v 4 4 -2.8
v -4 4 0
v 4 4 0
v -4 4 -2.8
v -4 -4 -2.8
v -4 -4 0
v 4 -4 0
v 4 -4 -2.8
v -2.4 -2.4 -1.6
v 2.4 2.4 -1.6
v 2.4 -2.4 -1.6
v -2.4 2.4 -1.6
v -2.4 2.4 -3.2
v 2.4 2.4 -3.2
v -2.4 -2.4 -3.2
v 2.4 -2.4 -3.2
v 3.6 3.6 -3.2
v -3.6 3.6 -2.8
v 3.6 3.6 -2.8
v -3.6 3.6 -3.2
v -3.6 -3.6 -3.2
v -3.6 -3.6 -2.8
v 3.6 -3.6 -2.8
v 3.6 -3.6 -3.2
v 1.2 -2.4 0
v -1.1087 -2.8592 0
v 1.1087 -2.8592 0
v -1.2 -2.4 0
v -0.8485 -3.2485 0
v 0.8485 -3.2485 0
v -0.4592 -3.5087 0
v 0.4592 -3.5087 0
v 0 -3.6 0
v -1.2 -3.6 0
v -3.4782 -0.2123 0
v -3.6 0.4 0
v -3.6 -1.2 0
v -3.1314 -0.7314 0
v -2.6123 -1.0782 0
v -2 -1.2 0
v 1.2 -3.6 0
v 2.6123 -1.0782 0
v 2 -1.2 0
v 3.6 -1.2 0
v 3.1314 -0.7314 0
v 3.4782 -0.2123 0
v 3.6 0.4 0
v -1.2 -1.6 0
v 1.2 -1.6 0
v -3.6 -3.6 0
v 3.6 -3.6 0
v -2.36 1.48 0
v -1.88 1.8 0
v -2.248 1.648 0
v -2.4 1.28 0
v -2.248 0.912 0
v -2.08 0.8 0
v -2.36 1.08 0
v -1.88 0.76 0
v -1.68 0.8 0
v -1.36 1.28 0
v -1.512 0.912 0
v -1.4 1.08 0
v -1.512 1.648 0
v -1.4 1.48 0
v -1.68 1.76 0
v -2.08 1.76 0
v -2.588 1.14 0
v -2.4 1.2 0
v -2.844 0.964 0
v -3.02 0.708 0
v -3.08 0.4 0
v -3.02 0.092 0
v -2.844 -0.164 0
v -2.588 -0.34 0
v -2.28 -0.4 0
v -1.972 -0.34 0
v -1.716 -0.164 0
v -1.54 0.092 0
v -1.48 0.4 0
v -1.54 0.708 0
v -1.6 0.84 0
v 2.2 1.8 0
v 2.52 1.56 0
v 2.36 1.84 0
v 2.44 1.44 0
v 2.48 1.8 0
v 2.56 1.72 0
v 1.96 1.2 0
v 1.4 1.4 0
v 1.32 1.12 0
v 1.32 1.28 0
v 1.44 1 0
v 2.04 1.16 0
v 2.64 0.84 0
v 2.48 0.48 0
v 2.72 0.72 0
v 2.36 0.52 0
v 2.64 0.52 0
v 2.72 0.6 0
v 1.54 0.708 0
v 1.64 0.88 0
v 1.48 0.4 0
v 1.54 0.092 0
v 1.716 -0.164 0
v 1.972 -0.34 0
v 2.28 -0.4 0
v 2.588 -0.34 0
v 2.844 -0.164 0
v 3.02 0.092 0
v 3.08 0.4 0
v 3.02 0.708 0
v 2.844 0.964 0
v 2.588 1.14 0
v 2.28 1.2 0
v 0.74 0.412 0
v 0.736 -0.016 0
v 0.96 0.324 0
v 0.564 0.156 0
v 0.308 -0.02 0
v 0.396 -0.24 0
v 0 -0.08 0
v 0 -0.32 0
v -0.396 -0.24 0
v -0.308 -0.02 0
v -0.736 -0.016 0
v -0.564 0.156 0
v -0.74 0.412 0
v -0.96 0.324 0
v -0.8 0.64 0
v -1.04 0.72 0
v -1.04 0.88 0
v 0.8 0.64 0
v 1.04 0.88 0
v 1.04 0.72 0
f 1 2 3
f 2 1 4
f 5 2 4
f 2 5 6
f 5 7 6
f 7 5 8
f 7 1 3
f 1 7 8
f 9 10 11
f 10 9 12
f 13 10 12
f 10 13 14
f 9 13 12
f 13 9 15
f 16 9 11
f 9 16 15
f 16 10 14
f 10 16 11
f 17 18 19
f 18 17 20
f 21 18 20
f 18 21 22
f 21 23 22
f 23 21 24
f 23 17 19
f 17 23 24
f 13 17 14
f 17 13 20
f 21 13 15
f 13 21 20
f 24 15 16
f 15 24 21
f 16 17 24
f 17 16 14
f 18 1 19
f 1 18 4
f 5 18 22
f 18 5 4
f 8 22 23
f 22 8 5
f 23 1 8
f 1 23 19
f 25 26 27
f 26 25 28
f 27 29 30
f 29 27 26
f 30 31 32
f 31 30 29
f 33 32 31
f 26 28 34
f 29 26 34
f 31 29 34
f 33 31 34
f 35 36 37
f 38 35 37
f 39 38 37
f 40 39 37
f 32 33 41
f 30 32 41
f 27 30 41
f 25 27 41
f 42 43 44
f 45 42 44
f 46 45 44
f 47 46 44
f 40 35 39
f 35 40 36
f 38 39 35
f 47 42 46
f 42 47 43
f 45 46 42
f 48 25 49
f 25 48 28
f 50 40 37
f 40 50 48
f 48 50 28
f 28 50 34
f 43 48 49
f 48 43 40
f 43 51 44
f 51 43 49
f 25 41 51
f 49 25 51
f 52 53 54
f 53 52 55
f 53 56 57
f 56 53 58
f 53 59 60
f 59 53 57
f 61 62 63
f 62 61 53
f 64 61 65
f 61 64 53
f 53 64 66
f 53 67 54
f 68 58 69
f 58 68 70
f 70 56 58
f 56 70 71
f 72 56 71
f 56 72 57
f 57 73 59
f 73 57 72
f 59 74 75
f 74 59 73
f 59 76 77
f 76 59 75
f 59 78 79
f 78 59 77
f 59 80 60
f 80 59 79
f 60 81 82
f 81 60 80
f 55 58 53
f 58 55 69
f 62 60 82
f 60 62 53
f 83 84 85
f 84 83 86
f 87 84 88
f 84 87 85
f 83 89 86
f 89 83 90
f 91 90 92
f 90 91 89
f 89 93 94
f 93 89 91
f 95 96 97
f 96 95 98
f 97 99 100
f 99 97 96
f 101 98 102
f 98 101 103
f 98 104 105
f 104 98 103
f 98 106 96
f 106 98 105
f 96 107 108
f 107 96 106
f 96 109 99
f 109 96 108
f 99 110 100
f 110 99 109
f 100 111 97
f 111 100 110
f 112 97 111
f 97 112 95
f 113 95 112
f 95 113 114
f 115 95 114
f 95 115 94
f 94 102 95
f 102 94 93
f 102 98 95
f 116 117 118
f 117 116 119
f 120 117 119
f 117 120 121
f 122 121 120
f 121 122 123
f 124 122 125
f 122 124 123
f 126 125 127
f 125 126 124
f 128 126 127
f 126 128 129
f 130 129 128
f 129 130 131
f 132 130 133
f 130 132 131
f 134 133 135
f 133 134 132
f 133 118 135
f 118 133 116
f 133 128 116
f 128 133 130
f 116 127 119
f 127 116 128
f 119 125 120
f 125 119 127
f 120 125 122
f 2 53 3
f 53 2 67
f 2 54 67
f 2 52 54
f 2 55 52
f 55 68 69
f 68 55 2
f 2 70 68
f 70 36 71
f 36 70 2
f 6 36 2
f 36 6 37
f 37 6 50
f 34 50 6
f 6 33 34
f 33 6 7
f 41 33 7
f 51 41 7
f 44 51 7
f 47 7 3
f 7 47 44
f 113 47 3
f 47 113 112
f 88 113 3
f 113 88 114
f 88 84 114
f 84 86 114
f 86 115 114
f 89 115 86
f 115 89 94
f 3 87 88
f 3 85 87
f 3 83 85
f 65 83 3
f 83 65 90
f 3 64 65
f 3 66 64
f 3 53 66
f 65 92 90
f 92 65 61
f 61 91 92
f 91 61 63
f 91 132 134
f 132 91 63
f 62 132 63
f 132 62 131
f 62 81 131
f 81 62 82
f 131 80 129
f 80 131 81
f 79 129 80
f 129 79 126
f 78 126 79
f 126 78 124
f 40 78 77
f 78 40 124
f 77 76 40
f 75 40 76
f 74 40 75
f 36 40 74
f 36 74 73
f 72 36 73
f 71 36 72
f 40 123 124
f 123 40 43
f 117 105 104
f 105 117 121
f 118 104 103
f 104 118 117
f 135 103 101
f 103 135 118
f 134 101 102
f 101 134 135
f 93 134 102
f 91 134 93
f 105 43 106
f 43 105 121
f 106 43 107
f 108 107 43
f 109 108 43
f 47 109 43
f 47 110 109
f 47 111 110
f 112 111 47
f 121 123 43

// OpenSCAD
// file: ../p/box5.scad
use <../lib.scad>
function ldraw_lib__box5() = [
// 0 Box with 5 Faces and All Edges
// 0 Name: box5.dat
// 0 Author: James Jessiman
// 0 !LDRAW_ORG Primitive UPDATE 2012-01
// 0 !LICENSE Licensed under CC BY 4.0 : see CAreadme.txt
// 
// 0 BFC CERTIFY CCW
  [0,"BFC","CERTIFY"],
  [0,"BFC","CCW"],
// 
// 0 !HISTORY 2002-04-03 [sbliss] Modified for BFC compliance
// 0 !HISTORY 2002-04-25 [PTadmin] Official Update 2002-02
// 0 !HISTORY 2007-06-24 [PTadmin] Header formatted for Contributor Agreement
// 0 !HISTORY 2008-07-01 [PTadmin] Official Update 2008-01
// 0 !HISTORY 2012-02-16 [Philo] Changed to CCW
// 0 !HISTORY 2012-03-30 [PTadmin] Official Update 2012-01
// 
// 
// 2 24 1 1 1 -1 1 1
  [2,24,1,1,1,-1,1,1],
// 2 24 -1 1 1 -1 1 -1
  [2,24,-1,1,1,-1,1,-1],
// 2 24 -1 1 -1 1 1 -1
  [2,24,-1,1,-1,1,1,-1],
// 2 24 1 1 -1 1 1 1
  [2,24,1,1,-1,1,1,1],
// 2 24 1 0 1 -1 0 1
  [2,24,1,0,1,-1,0,1],
// 2 24 -1 0 1 -1 0 -1
  [2,24,-1,0,1,-1,0,-1],
// 2 24 -1 0 -1 1 0 -1
  [2,24,-1,0,-1,1,0,-1],
// 2 24 1 0 -1 1 0 1
  [2,24,1,0,-1,1,0,1],
// 2 24 1 0 1 1 1 1
  [2,24,1,0,1,1,1,1],
// 2 24 -1 0 1 -1 1 1
  [2,24,-1,0,1,-1,1,1],
// 2 24 1 0 -1 1 1 -1
  [2,24,1,0,-1,1,1,-1],
// 2 24 -1 0 -1 -1 1 -1
  [2,24,-1,0,-1,-1,1,-1],
// 4 16 -1 1 1 1 1 1 1 1 -1 -1 1 -1
  [4,16,-1,1,1,1,1,1,1,1,-1,-1,1,-1],
// 4 16 -1 1 1 -1 0 1 1 0 1 1 1 1
  [4,16,-1,1,1,-1,0,1,1,0,1,1,1,1],
// 4 16 -1 1 -1 -1 0 -1 -1 0 1 -1 1 1
  [4,16,-1,1,-1,-1,0,-1,-1,0,1,-1,1,1],
// 4 16 1 1 -1 1 0 -1 -1 0 -1 -1 1 -1
  [4,16,1,1,-1,1,0,-1,-1,0,-1,-1,1,-1],
// 4 16 1 1 1 1 0 1 1 0 -1 1 1 -1
  [4,16,1,1,1,1,0,1,1,0,-1,1,1,-1],
];
module ldraw_lib__box5(step=0, col=false, unit=2/5, alt=false, line=0.2, solid=!$preview)
    makepoly(ldraw_lib__box5(), step=step, col=col, unit=unit, alt=alt, line=line, solid=solid);
ldraw_lib__box5(line=0.2);
// file: ../p/box4.scad
use <../lib.scad>
function ldraw_lib__box4() = [
// 0 Box with 4 Faces (2 Parallel Pairs) and All Edges
// 0 Name: box4.dat
// 0 Author: James Jessiman
// 0 !LDRAW_ORG Primitive UPDATE 2012-01
// 0 !LICENSE Licensed under CC BY 4.0 : see CAreadme.txt
// 
// 0 BFC CERTIFY CCW
  [0,"BFC","CERTIFY"],
  [0,"BFC","CCW"],
// 
// 0 !HISTORY 2002-04-03 [sbliss] Modified for BFC compliance
// 0 !HISTORY 2002-04-25 [PTadmin] Official Update 2002-02
// 0 !HISTORY 2007-06-24 [PTadmin] Header formatted for Contributor Agreement
// 0 !HISTORY 2008-07-01 [PTadmin] Official Update 2008-01
// 0 !HISTORY 2012-02-16 [Philo] Changed to CCW
// 0 !HISTORY 2012-03-30 [PTadmin] Official Update 2012-01
// 
// 
// 2 24 1 1 1 -1 1 1
  [2,24,1,1,1,-1,1,1],
// 2 24 -1 1 1 -1 1 -1
  [2,24,-1,1,1,-1,1,-1],
// 2 24 -1 1 -1 1 1 -1
  [2,24,-1,1,-1,1,1,-1],
// 2 24 1 1 -1 1 1 1
  [2,24,1,1,-1,1,1,1],
// 2 24 1 0 1 -1 0 1
  [2,24,1,0,1,-1,0,1],
// 2 24 -1 0 1 -1 0 -1
  [2,24,-1,0,1,-1,0,-1],
// 2 24 -1 0 -1 1 0 -1
  [2,24,-1,0,-1,1,0,-1],
// 2 24 1 0 -1 1 0 1
  [2,24,1,0,-1,1,0,1],
// 2 24 1 0 1 1 1 1
  [2,24,1,0,1,1,1,1],
// 2 24 -1 0 1 -1 1 1
  [2,24,-1,0,1,-1,1,1],
// 2 24 1 0 -1 1 1 -1
  [2,24,1,0,-1,1,1,-1],
// 2 24 -1 0 -1 -1 1 -1
  [2,24,-1,0,-1,-1,1,-1],
// 4 16 -1 1 1 -1 0 1 1 0 1 1 1 1
  [4,16,-1,1,1,-1,0,1,1,0,1,1,1,1],
// 4 16 -1 1 -1 -1 0 -1 -1 0 1 -1 1 1
  [4,16,-1,1,-1,-1,0,-1,-1,0,1,-1,1,1],
// 4 16 1 1 -1 1 0 -1 -1 0 -1 -1 1 -1
  [4,16,1,1,-1,1,0,-1,-1,0,-1,-1,1,-1],
// 4 16 1 1 1 1 0 1 1 0 -1 1 1 -1
  [4,16,1,1,1,1,0,1,1,0,-1,1,1,-1],
];
module ldraw_lib__box4(step=0, col=false, unit=2/5, alt=false, line=0.2, solid=!$preview)
    makepoly(ldraw_lib__box4(), step=step, col=col, unit=unit, alt=alt, line=line, solid=solid);
ldraw_lib__box4(line=0.2);
// file: s/3070bs01.scad
use <../../lib.scad>
use <../../p/box4.scad>
use <../../p/box5.scad>
function ldraw_lib__s__3070bs01() = [
// 0 ~Tile  1 x  1 with Groove without Top Face
// 0 Name: s\3070bs01.dat
// 0 Author: Chris Dee [cwdee]
// 0 !LDRAW_ORG Subpart UPDATE 2009-02
// 0 !LICENSE Licensed under CC BY 4.0 : see CAreadme.txt
// 
// 0 BFC CERTIFY CCW
  [0,"BFC","CERTIFY"],
  [0,"BFC","CCW"],
// 
// 0 !HISTORY 2009-09-03 [PTadmin] Official Update 2009-02
// 
// 
// 1 16 0 0 0 10 0 0 0 7 0 0 0 10 box4.dat
  [1,16,0,0,0,10,0,0,0,7,0,0,0,10, ldraw_lib__box4()],
// 0 BFC INVERTNEXT
  [0,"BFC","INVERTNEXT"],
// 1 16 0 8 0 6 0 0 0 -4 0 0 0 6 box5.dat
  [1,16,0,8,0,6,0,0,0,-4,0,0,0,6, ldraw_lib__box5()],
// 1 16 0 7 0 9 0 0 0 1 0 0 0 9 box4.dat
  [1,16,0,7,0,9,0,0,0,1,0,0,0,9, ldraw_lib__box4()],
// 
// 4 16 9 8 9 6 8 6 -6 8 6 -9 8 9
  [4,16,9,8,9,6,8,6,-6,8,6,-9,8,9],
// 4 16 -9 8 9 -6 8 6 -6 8 -6 -9 8 -9
  [4,16,-9,8,9,-6,8,6,-6,8,-6,-9,8,-9],
// 4 16 -9 8 -9 -6 8 -6 6 8 -6 9 8 -9
  [4,16,-9,8,-9,-6,8,-6,6,8,-6,9,8,-9],
// 4 16 9 8 -9 6 8 -6 6 8 6 9 8 9
  [4,16,9,8,-9,6,8,-6,6,8,6,9,8,9],
// 
// 4 16 10 7 10 9 7 9 -9 7 9 -10 7 10
  [4,16,10,7,10,9,7,9,-9,7,9,-10,7,10],
// 4 16 -10 7 10 -9 7 9 -9 7 -9 -10 7 -10
  [4,16,-10,7,10,-9,7,9,-9,7,-9,-10,7,-10],
// 4 16 -10 7 -10 -9 7 -9 9 7 -9 10 7 -10
  [4,16,-10,7,-10,-9,7,-9,9,7,-9,10,7,-10],
// 4 16 10 7 -10 9 7 -9 9 7 9 10 7 10
  [4,16,10,7,-10,9,7,-9,9,7,9,10,7,10],
// 0
];
module ldraw_lib__s__3070bs01(step=0, col=false, unit=2/5, alt=false, line=0.2, solid=!$preview)
    makepoly(ldraw_lib__s__3070bs01(), step=step, col=col, unit=unit, alt=alt, line=line, solid=solid);
ldraw_lib__s__3070bs01(line=0.2);
// file: ../p/2-4chrd.scad
use <../lib.scad>
function ldraw_lib__2_4chrd() = [
// 0 Chord 0.5
// 0 Name: 2-4chrd.dat
// 0 Author: Philippe Hurbain [Philo]
// 0 !LDRAW_ORG Primitive UPDATE 2014-01
// 0 !LICENSE Licensed under CC BY 4.0 : see CAreadme.txt
// 
// 0 BFC CERTIFY CCW
  [0,"BFC","CERTIFY"],
  [0,"BFC","CCW"],
// 
// 0 !HISTORY 2014-06-21 [PTadmin] Official Update 2014-01
// 
// 
// 4 16 0.9239 0 0.3827 -0.9239 0 0.3827 -1 0 0 1 0 0
  [4,16,0.9239,0,0.3827,-0.9239,0,0.3827,-1,0,0,1,0,0],
// 4 16 0.7071 0 0.7071 -0.7071 0 0.7071 -0.9239 0 0.3827 0.9239 0 0.3827
  [4,16,0.7071,0,0.7071,-0.7071,0,0.7071,-0.9239,0,0.3827,0.9239,0,0.3827],
// 4 16 0.3827 0 0.9239 -0.3827 0 0.9239 -0.7071 0 0.7071 0.7071 0 0.7071
  [4,16,0.3827,0,0.9239,-0.3827,0,0.9239,-0.7071,0,0.7071,0.7071,0,0.7071],
// 3 16 0 0 1 -0.3827 0 0.9239 0.3827 0 0.9239
  [3,16,0,0,1,-0.3827,0,0.9239,0.3827,0,0.9239],
];
module ldraw_lib__2_4chrd(step=0, col=false, unit=2/5, alt=false, line=0.2, solid=!$preview)
    makepoly(ldraw_lib__2_4chrd(), step=step, col=col, unit=unit, alt=alt, line=line, solid=solid);
ldraw_lib__2_4chrd(line=0.2);
// file: ../p/1-4ndis.scad
use <../lib.scad>
function ldraw_lib__1_4ndis() = [
// 0 Disc Negative 0.25
// 0 Name: 1-4ndis.dat
// 0 Author: James Jessiman
// 0 !LDRAW_ORG Primitive UPDATE 2012-01
// 0 !LICENSE Licensed under CC BY 4.0 : see CAreadme.txt
// 
// 0 BFC CERTIFY CCW
  [0,"BFC","CERTIFY"],
  [0,"BFC","CCW"],
// 
// 0 !HISTORY 2002-03-23 [sbliss] Added BFC Statement
// 0 !HISTORY 2002-04-25 [PTadmin] Official Update 2002-02
// 0 !HISTORY 2007-06-22 [PTadmin] Header formatted for Contributor Agreement
// 0 !HISTORY 2008-07-01 [PTadmin] Official Update 2008-01
// 0 !HISTORY 2012-02-16 [Philo] Changed to CCW
// 0 !HISTORY 2012-03-30 [PTadmin] Official Update 2012-01
// 
// 
// 3 16 0.9239 0 0.3827 1 0 0 1 0 1
  [3,16,0.9239,0,0.3827,1,0,0,1,0,1],
// 3 16 0.7071 0 0.7071 0.9239 0 0.3827 1 0 1
  [3,16,0.7071,0,0.7071,0.9239,0,0.3827,1,0,1],
// 3 16 0.3827 0 0.9239 0.7071 0 0.7071 1 0 1
  [3,16,0.3827,0,0.9239,0.7071,0,0.7071,1,0,1],
// 3 16 0 0 1 0.3827 0 0.9239 1 0 1
  [3,16,0,0,1,0.3827,0,0.9239,1,0,1],
];
module ldraw_lib__1_4ndis(step=0, col=false, unit=2/5, alt=false, line=0.2, solid=!$preview)
    makepoly(ldraw_lib__1_4ndis(), step=step, col=col, unit=unit, alt=alt, line=line, solid=solid);
ldraw_lib__1_4ndis(line=0.2);
// file: ../p/1-4chrd.scad
use <../lib.scad>
function ldraw_lib__1_4chrd() = [
// 0 Chord 0.25
// 0 Name: 1-4chrd.dat
// 0 Author: Max Martin Richter [MMR1988]
// 0 !LDRAW_ORG Primitive UPDATE 2023-05
// 0 !LICENSE Licensed under CC BY 4.0 : see CAreadme.txt
// 
// 0 BFC CERTIFY CCW
  [0,"BFC","CERTIFY"],
  [0,"BFC","CCW"],
// 
// 0 !HISTORY 2004-04-22 [PTadmin] Official Update 2004-02
// 0 !HISTORY 2007-10-09 [PTadmin] Header formatted for Contributor Agreement
// 0 !HISTORY 2008-07-01 [PTadmin] Official Update 2008-01
// 0 !HISTORY 2012-08-02 [MMR1988] Re-creation with PrimGen2 and Rectifier
// 0 !HISTORY 2012-08-09 [PTadmin] Official Update 2012-02
// 0 !HISTORY 2023-10-27 [OrionP] Change author to MMR1988 from hafhead
// 0 !HISTORY 2023-10-31 [OrionP] Official Update 2023-05
// 
// 4 16 0.9239 0 0.3827 0.3827 0 0.9239 0 0 1 1 0 0
  [4,16,0.9239,0,0.3827,0.3827,0,0.9239,0,0,1,1,0,0],
// 3 16 0.7071 0 0.7071 0.3827 0 0.9239 0.9239 0 0.3827
  [3,16,0.7071,0,0.7071,0.3827,0,0.9239,0.9239,0,0.3827],
];
module ldraw_lib__1_4chrd(step=0, col=false, unit=2/5, alt=false, line=0.2, solid=!$preview)
    makepoly(ldraw_lib__1_4chrd(), step=step, col=col, unit=unit, alt=alt, line=line, solid=solid);
ldraw_lib__1_4chrd(line=0.2);
// main file
use <../lib.scad>
use <../p/1-4chrd.scad>
use <../p/1-4ndis.scad>
use <../p/2-4chrd.scad>
use <s/3070bs01.scad>
function ldraw_lib__3070bp1d() = [
// 0 Tile  1 x  1 with Emoji Face, Left Wink, Coral Mouth and Cheeks Pattern
// 0 Name: 3070bp1d.dat
// 0 Author: Takeshi Takahashi [RainbowDolphin]
// 0 !LDRAW_ORG Part UPDATE 2024-06
// 0 !LICENSE Licensed under CC BY 4.0 : see CAreadme.txt
// 
// 0 BFC CERTIFY CCW
  [0,"BFC","CERTIFY"],
  [0,"BFC","CCW"],
// 
// 0 !KEYWORDS Bricklink 3070bpb202, Brickowl 610474, Dots, Ice cream
// 0 !KEYWORDS Rebrickable 3070bpr0218, Set 41910
// 
// 0 !HISTORY 2024-07-29 [OrionP] Official Update 2024-06
// 
// 1 16 0 0 0 1 0 0 0 1 0 0 0 1 s\3070bs01.dat
  [1,16,0,0,0,1,0,0,0,1,0,0,0,1, ldraw_lib__s__3070bs01()],
// 1 25 0 0 -6 -3 0 0 0 1 0 0 0 -3 2-4chrd.dat
  [1,25,0,0,-6,-3,0,0,0,1,0,0,0,-3, ldraw_lib__2_4chrd()],
// 1 14 0 0 -6 -3 0 0 0 1 0 0 0 -3 1-4ndis.dat
  [1,14,0,0,-6,-3,0,0,0,1,0,0,0,-3, ldraw_lib__1_4ndis()],
// 1 14 -5 0 1 -4 0 0 0 1 0 0 0 -4 1-4ndis.dat
  [1,14,-5,0,1,-4,0,0,0,1,0,0,0,-4, ldraw_lib__1_4ndis()],
// 1 14 0 0 -6 0 0 3 0 1 0 -3 0 0 1-4ndis.dat
  [1,14,0,0,-6,0,0,3,0,1,0,-3,0,0, ldraw_lib__1_4ndis()],
// 1 14 5 0 1 0 0 4 0 1 0 -4 0 0 1-4ndis.dat
  [1,14,5,0,1,0,0,4,0,1,0,-4,0,0, ldraw_lib__1_4ndis()],
// 1 16 -5 0 1 -4 0 0 0 1 0 0 0 -4 1-4chrd.dat
  [1,16,-5,0,1,-4,0,0,0,1,0,0,0,-4, ldraw_lib__1_4chrd()],
// 1 16 5 0 1 0 0 4 0 1 0 -4 0 0 1-4chrd.dat
  [1,16,5,0,1,0,0,4,0,1,0,-4,0,0, ldraw_lib__1_4chrd()],
// 4 25 3 0 -4 -3 0 -4 -3 0 -6 3 0 -6
  [4,25,3,0,-4,-3,0,-4,-3,0,-6,3,0,-6],
// 4 14 -5 0 -3 -9 0 -3 -9 0 -9 -3 0 -4
  [4,14,-5,0,-3,-9,0,-3,-9,0,-9,-3,0,-4],
// 3 14 -3 0 -4 -9 0 -9 -3 0 -6
  [3,14,-3,0,-4,-9,0,-9,-3,0,-6],
// 3 14 -3 0 -6 -9 0 -9 -3 0 -9
  [3,14,-3,0,-6,-9,0,-9,-3,0,-9],
// 4 14 -5 0 -3 -3 0 -4 3 0 -4 5 0 -3
  [4,14,-5,0,-3,-3,0,-4,3,0,-4,5,0,-3],
// 4 14 5 0 -3 3 0 -4 9 0 -9 9 0 -3
  [4,14,5,0,-3,3,0,-4,9,0,-9,9,0,-3],
// 3 14 3 0 -6 3 0 -9 9 0 -9
  [3,14,3,0,-6,3,0,-9,9,0,-9],
// 3 14 3 0 -4 3 0 -6 9 0 -9
  [3,14,3,0,-4,3,0,-6,9,0,-9],
// 4 0 -5.9 0 3.7 -6 0 3.2 -4.7 0 4.5 -5.62 0 4.12
  [4,0,-5.9,0,3.7,-6,0,3.2,-4.7,0,4.5,-5.62,0,4.12],
// 4 0 -4.7 0 4.5 -5.9 0 2.7 -5.62 0 2.28 -5.2 0 2
  [4,0,-4.7,0,4.5,-5.9,0,2.7,-5.62,0,2.28,-5.2,0,2],
// 4 0 -4.7 0 4.5 -5.2 0 2 -4.7 0 1.9 -4.2 0 2
  [4,0,-4.7,0,4.5,-5.2,0,2,-4.7,0,1.9,-4.2,0,2],
// 4 0 -4.7 0 4.5 -3.78 0 2.28 -3.5 0 2.7 -3.4 0 3.2
  [4,0,-4.7,0,4.5,-3.78,0,2.28,-3.5,0,2.7,-3.4,0,3.2],
// 4 0 -4.7 0 4.5 -3.4 0 3.2 -3.5 0 3.7 -3.78 0 4.12
  [4,0,-4.7,0,4.5,-3.4,0,3.2,-3.5,0,3.7,-3.78,0,4.12],
// 3 0 -4.7 0 4.5 -3.78 0 4.12 -4.2 0 4.4
  [3,0,-4.7,0,4.5,-3.78,0,4.12,-4.2,0,4.4],
// 3 0 -4.7 0 4.5 -5.2 0 4.4 -5.62 0 4.12
  [3,0,-4.7,0,4.5,-5.2,0,4.4,-5.62,0,4.12],
// 4 353 -5.9 0 2.7 -6 0 3 -6.47 0 2.85 -7.11 0 2.41
  [4,353,-5.9,0,2.7,-6,0,3,-6.47,0,2.85,-7.11,0,2.41],
// 4 353 -5.62 0 2.28 -5.9 0 2.7 -7.11 0 2.41 -7.55 0 1.77
  [4,353,-5.62,0,2.28,-5.9,0,2.7,-7.11,0,2.41,-7.55,0,1.77],
// 4 353 -5.2 0 2 -5.62 0 2.28 -7.55 0 1.77 -7.7 0 1
  [4,353,-5.2,0,2,-5.62,0,2.28,-7.55,0,1.77,-7.7,0,1],
// 4 353 -4.7 0 1.9 -5.2 0 2 -7.7 0 1 -7.55 0 0.23
  [4,353,-4.7,0,1.9,-5.2,0,2,-7.7,0,1,-7.55,0,0.23],
// 4 353 -4.7 0 1.9 -7.55 0 0.23 -7.11 0 -0.41 -6.47 0 -0.85
  [4,353,-4.7,0,1.9,-7.55,0,0.23,-7.11,0,-0.41,-6.47,0,-0.85],
// 4 353 -4.7 0 1.9 -6.47 0 -0.85 -5.7 0 -1 -4.93 0 -0.85
  [4,353,-4.7,0,1.9,-6.47,0,-0.85,-5.7,0,-1,-4.93,0,-0.85],
// 4 353 -4.7 0 1.9 -4.93 0 -0.85 -4.29 0 -0.41 -3.85 0 0.23
  [4,353,-4.7,0,1.9,-4.93,0,-0.85,-4.29,0,-0.41,-3.85,0,0.23],
// 4 353 -4.2 0 2 -4.7 0 1.9 -3.85 0 0.23 -3.7 0 1
  [4,353,-4.2,0,2,-4.7,0,1.9,-3.85,0,0.23,-3.7,0,1],
// 4 353 -4 0 2.1 -4.2 0 2 -3.7 0 1 -3.85 0 1.77
  [4,353,-4,0,2.1,-4.2,0,2,-3.7,0,1,-3.85,0,1.77],
// 4 0 -4.7 0 4.5 -6 0 3.2 -6 0 3 -5.9 0 2.7
  [4,0,-4.7,0,4.5,-6,0,3.2,-6,0,3,-5.9,0,2.7],
// 4 0 -4 0 2.1 -3.78 0 2.28 -4.7 0 4.5 -4.2 0 2
  [4,0,-4,0,2.1,-3.78,0,2.28,-4.7,0,4.5,-4.2,0,2],
// 4 0 5.9 0 4.6 5.5 0 4.5 6.1 0 3.6 6.3 0 3.9
  [4,0,5.9,0,4.6,5.5,0,4.5,6.1,0,3.6,6.3,0,3.9],
// 4 0 6.2 0 4.5 5.9 0 4.6 6.3 0 3.9 6.4 0 4.3
  [4,0,6.2,0,4.5,5.9,0,4.6,6.3,0,3.9,6.4,0,4.3],
// 4 0 4.9 0 3 6.1 0 3.6 5.5 0 4.5 3.5 0 3.5
  [4,0,4.9,0,3,6.1,0,3.6,5.5,0,4.5,3.5,0,3.5],
// 4 0 4.9 0 3 3.5 0 3.5 3.3 0 3.2 3.3 0 2.8
  [4,0,4.9,0,3,3.5,0,3.5,3.3,0,3.2,3.3,0,2.8],
// 4 0 4.9 0 3 3.3 0 2.8 3.6 0 2.5 5.1 0 2.9
  [4,0,4.9,0,3,3.3,0,2.8,3.6,0,2.5,5.1,0,2.9],
// 4 0 6.8 0 1.8 6.6 0 2.1 5.9 0 1.3 6.2 0 1.2
  [4,0,6.8,0,1.8,6.6,0,2.1,5.9,0,1.3,6.2,0,1.2],
// 4 0 6.8 0 1.8 6.2 0 1.2 6.6 0 1.3 6.8 0 1.5
  [4,0,6.8,0,1.8,6.2,0,1.2,6.6,0,1.3,6.8,0,1.5],
// 4 353 5.9 0 1.3 4.1 0 2.2 3.85 0 1.77 3.7 0 1
  [4,353,5.9,0,1.3,4.1,0,2.2,3.85,0,1.77,3.7,0,1],
// 4 353 5.9 0 1.3 3.7 0 1 3.85 0 0.23 4.29 0 -0.41
  [4,353,5.9,0,1.3,3.7,0,1,3.85,0,0.23,4.29,0,-0.41],
// 4 353 5.9 0 1.3 4.29 0 -0.41 4.93 0 -0.85 6.2 0 1.2
  [4,353,5.9,0,1.3,4.29,0,-0.41,4.93,0,-0.85,6.2,0,1.2],
// 4 353 6.2 0 1.2 4.93 0 -0.85 5.7 0 -1 6.47 0 -0.85
  [4,353,6.2,0,1.2,4.93,0,-0.85,5.7,0,-1,6.47,0,-0.85],
// 4 353 6.6 0 1.3 6.2 0 1.2 6.47 0 -0.85 7.11 0 -0.41
  [4,353,6.6,0,1.3,6.2,0,1.2,6.47,0,-0.85,7.11,0,-0.41],
// 4 353 6.8 0 1.5 6.6 0 1.3 7.11 0 -0.41 7.55 0 0.23
  [4,353,6.8,0,1.5,6.6,0,1.3,7.11,0,-0.41,7.55,0,0.23],
// 4 353 6.8 0 1.5 7.55 0 0.23 7.7 0 1 6.8 0 1.8
  [4,353,6.8,0,1.5,7.55,0,0.23,7.7,0,1,6.8,0,1.8],
// 4 353 6.8 0 1.8 7.7 0 1 7.55 0 1.77 6.6 0 2.1
  [4,353,6.8,0,1.8,7.7,0,1,7.55,0,1.77,6.6,0,2.1],
// 4 353 6.6 0 2.1 7.55 0 1.77 7.11 0 2.41 6.47 0 2.85
  [4,353,6.6,0,2.1,7.55,0,1.77,7.11,0,2.41,6.47,0,2.85],
// 4 353 6.6 0 2.1 6.47 0 2.85 5.7 0 3 5.1 0 2.9
  [4,353,6.6,0,2.1,6.47,0,2.85,5.7,0,3,5.1,0,2.9],
// 4 0 5.1 0 2.9 3.6 0 2.5 4.1 0 2.2 6.6 0 2.1
  [4,0,5.1,0,2.9,3.6,0,2.5,4.1,0,2.2,6.6,0,2.1],
// 3 0 4.1 0 2.2 5.9 0 1.3 6.6 0 2.1
  [3,0,4.1,0,2.2,5.9,0,1.3,6.6,0,2.1],
// 4 0 2.4 0 0.81 1.85 0 1.03 1.41 0 0.39 1.84 0 -0.04
  [4,0,2.4,0,0.81,1.85,0,1.03,1.41,0,0.39,1.84,0,-0.04],
// 4 0 1.84 0 -0.04 1.41 0 0.39 0.77 0 -0.05 0.99 0 -0.6
  [4,0,1.84,0,-0.04,1.41,0,0.39,0.77,0,-0.05,0.99,0,-0.6],
// 4 0 0.99 0 -0.6 0.77 0 -0.05 0 0 -0.2 0 0 -0.8
  [4,0,0.99,0,-0.6,0.77,0,-0.05,0,0,-0.2,0,0,-0.8],
// 4 0 0 0 -0.8 0 0 -0.2 -0.77 0 -0.05 -0.99 0 -0.6
  [4,0,0,0,-0.8,0,0,-0.2,-0.77,0,-0.05,-0.99,0,-0.6],
// 4 0 -0.99 0 -0.6 -0.77 0 -0.05 -1.41 0 0.39 -1.84 0 -0.04
  [4,0,-0.99,0,-0.6,-0.77,0,-0.05,-1.41,0,0.39,-1.84,0,-0.04],
// 4 0 -1.84 0 -0.04 -1.41 0 0.39 -1.85 0 1.03 -2.4 0 0.81
  [4,0,-1.84,0,-0.04,-1.41,0,0.39,-1.85,0,1.03,-2.4,0,0.81],
// 4 0 -2.4 0 0.81 -1.85 0 1.03 -2 0 1.6 -2.6 0 1.8
  [4,0,-2.4,0,0.81,-1.85,0,1.03,-2,0,1.6,-2.6,0,1.8],
// 4 0 -2.6 0 2.2 -2.6 0 1.8 -2 0 1.6 2 0 1.6
  [4,0,-2.6,0,2.2,-2.6,0,1.8,-2,0,1.6,2,0,1.6],
// 4 0 2.6 0 2.2 -2.6 0 2.2 2 0 1.6 2.6 0 1.8
  [4,0,2.6,0,2.2,-2.6,0,2.2,2,0,1.6,2.6,0,1.8],
// 4 0 2.6 0 1.8 2 0 1.6 1.85 0 1.03 2.4 0 0.81
  [4,0,2.6,0,1.8,2,0,1.6,1.85,0,1.03,2.4,0,0.81],
// 4 353 2 0 1.6 -2 0 1.6 -1.85 0 1.03 1.85 0 1.03
  [4,353,2,0,1.6,-2,0,1.6,-1.85,0,1.03,1.85,0,1.03],
// 4 353 1.85 0 1.03 -1.85 0 1.03 -1.41 0 0.39 1.41 0 0.39
  [4,353,1.85,0,1.03,-1.85,0,1.03,-1.41,0,0.39,1.41,0,0.39],
// 4 353 1.41 0 0.39 -1.41 0 0.39 -0.77 0 -0.05 0.77 0 -0.05
  [4,353,1.41,0,0.39,-1.41,0,0.39,-0.77,0,-0.05,0.77,0,-0.05],
// 3 353 0.77 0 -0.05 -0.77 0 -0.05 0 0 -0.2
  [3,353,0.77,0,-0.05,-0.77,0,-0.05,0,0,-0.2],
// 4 16 -4.7 0 4.5 10 0 10 -10 0 10 -5.2 0 4.4
  [4,16,-4.7,0,4.5,10,0,10,-10,0,10,-5.2,0,4.4],
// 3 16 -10 0 10 -5.62 0 4.12 -5.2 0 4.4
  [3,16,-10,0,10,-5.62,0,4.12,-5.2,0,4.4],
// 3 16 -10 0 10 -5.9 0 3.7 -5.62 0 4.12
  [3,16,-10,0,10,-5.9,0,3.7,-5.62,0,4.12],
// 3 16 -10 0 10 -6 0 3.2 -5.9 0 3.7
  [3,16,-10,0,10,-6,0,3.2,-5.9,0,3.7],
// 4 16 -6 0 3 -6 0 3.2 -10 0 10 -6.47 0 2.85
  [4,16,-6,0,3,-6,0,3.2,-10,0,10,-6.47,0,2.85],
// 3 16 -10 0 10 -7.11 0 2.41 -6.47 0 2.85
  [3,16,-10,0,10,-7.11,0,2.41,-6.47,0,2.85],
// 4 16 -7.55 0 1.77 -7.11 0 2.41 -10 0 10 -9 0 1
  [4,16,-7.55,0,1.77,-7.11,0,2.41,-10,0,10,-9,0,1],
// 4 16 -9 0 1 -10 0 10 -10 0 -10 -9 0 -3
  [4,16,-9,0,1,-10,0,10,-10,0,-10,-9,0,-3],
// 3 16 -9 0 -3 -10 0 -10 -9 0 -9
  [3,16,-9,0,-3,-10,0,-10,-9,0,-9],
// 3 16 -3 0 -9 -9 0 -9 -10 0 -10
  [3,16,-3,0,-9,-9,0,-9,-10,0,-10],
// 4 16 0 0 -9 -3 0 -9 -10 0 -10 10 0 -10
  [4,16,0,0,-9,-3,0,-9,-10,0,-10,10,0,-10],
// 3 16 3 0 -9 0 0 -9 10 0 -10
  [3,16,3,0,-9,0,0,-9,10,0,-10],
// 3 16 9 0 -9 3 0 -9 10 0 -10
  [3,16,9,0,-9,3,0,-9,10,0,-10],
// 3 16 9 0 -3 9 0 -9 10 0 -10
  [3,16,9,0,-3,9,0,-9,10,0,-10],
// 4 16 9 0 1 9 0 -3 10 0 -10 10 0 10
  [4,16,9,0,1,9,0,-3,10,0,-10,10,0,10],
// 4 16 7.55 0 1.77 9 0 1 10 0 10 7.11 0 2.41
  [4,16,7.55,0,1.77,9,0,1,10,0,10,7.11,0,2.41],
// 4 16 6.47 0 2.85 7.11 0 2.41 10 0 10 6.4 0 4.3
  [4,16,6.47,0,2.85,7.11,0,2.41,10,0,10,6.4,0,4.3],
// 3 16 6.4 0 4.3 6.3 0 3.9 6.47 0 2.85
  [3,16,6.4,0,4.3,6.3,0,3.9,6.47,0,2.85],
// 3 16 6.3 0 3.9 6.1 0 3.6 6.47 0 2.85
  [3,16,6.3,0,3.9,6.1,0,3.6,6.47,0,2.85],
// 3 16 6.1 0 3.6 5.7 0 3 6.47 0 2.85
  [3,16,6.1,0,3.6,5.7,0,3,6.47,0,2.85],
// 4 16 5.1 0 2.9 5.7 0 3 6.1 0 3.6 4.9 0 3
  [4,16,5.1,0,2.9,5.7,0,3,6.1,0,3.6,4.9,0,3],
// 3 16 10 0 10 6.2 0 4.5 6.4 0 4.3
  [3,16,10,0,10,6.2,0,4.5,6.4,0,4.3],
// 3 16 10 0 10 5.9 0 4.6 6.2 0 4.5
  [3,16,10,0,10,5.9,0,4.6,6.2,0,4.5],
// 3 16 10 0 10 5.5 0 4.5 5.9 0 4.6
  [3,16,10,0,10,5.5,0,4.5,5.9,0,4.6],
// 4 16 3.5 0 3.5 5.5 0 4.5 10 0 10 -3.5 0 3.7
  [4,16,3.5,0,3.5,5.5,0,4.5,10,0,10,-3.5,0,3.7],
// 3 16 10 0 10 -3.78 0 4.12 -3.5 0 3.7
  [3,16,10,0,10,-3.78,0,4.12,-3.5,0,3.7],
// 3 16 10 0 10 -4.2 0 4.4 -3.78 0 4.12
  [3,16,10,0,10,-4.2,0,4.4,-3.78,0,4.12],
// 3 16 10 0 10 -4.7 0 4.5 -4.2 0 4.4
  [3,16,10,0,10,-4.7,0,4.5,-4.2,0,4.4],
// 4 16 3.5 0 3.5 -3.5 0 3.7 -3.4 0 3.2 3.3 0 3.2
  [4,16,3.5,0,3.5,-3.5,0,3.7,-3.4,0,3.2,3.3,0,3.2],
// 4 16 3.3 0 3.2 -3.4 0 3.2 -3.5 0 2.7 3.3 0 2.8
  [4,16,3.3,0,3.2,-3.4,0,3.2,-3.5,0,2.7,3.3,0,2.8],
// 4 16 2.6 0 2.2 3.3 0 2.8 -3.5 0 2.7 -2.6 0 2.2
  [4,16,2.6,0,2.2,3.3,0,2.8,-3.5,0,2.7,-2.6,0,2.2],
// 4 16 -2.6 0 2.2 -3.5 0 2.7 -3.78 0 2.28 -2.6 0 1.8
  [4,16,-2.6,0,2.2,-3.5,0,2.7,-3.78,0,2.28,-2.6,0,1.8],
// 4 16 -2.6 0 1.8 -3.78 0 2.28 -4 0 2.1 -3.85 0 1.77
  [4,16,-2.6,0,1.8,-3.78,0,2.28,-4,0,2.1,-3.85,0,1.77],
// 4 16 -2.4 0 0.81 -2.6 0 1.8 -3.85 0 1.77 -3.7 0 1
  [4,16,-2.4,0,0.81,-2.6,0,1.8,-3.85,0,1.77,-3.7,0,1],
// 4 16 -1.84 0 -0.04 -2.4 0 0.81 -3.7 0 1 -3.85 0 0.23
  [4,16,-1.84,0,-0.04,-2.4,0,0.81,-3.7,0,1,-3.85,0,0.23],
// 4 16 -0.99 0 -0.6 -1.84 0 -0.04 -3.85 0 0.23 -4.29 0 -0.41
  [4,16,-0.99,0,-0.6,-1.84,0,-0.04,-3.85,0,0.23,-4.29,0,-0.41],
// 4 16 -5 0 -3 -0.99 0 -0.6 -4.29 0 -0.41 -4.93 0 -0.85
  [4,16,-5,0,-3,-0.99,0,-0.6,-4.29,0,-0.41,-4.93,0,-0.85],
// 3 16 -4.93 0 -0.85 -5.7 0 -1 -5 0 -3
  [3,16,-4.93,0,-0.85,-5.7,0,-1,-5,0,-3],
// 3 16 -6.47 0 -0.85 -5 0 -3 -5.7 0 -1
  [3,16,-6.47,0,-0.85,-5,0,-3,-5.7,0,-1],
// 3 16 -7.11 0 -0.41 -5 0 -3 -6.47 0 -0.85
  [3,16,-7.11,0,-0.41,-5,0,-3,-6.47,0,-0.85],
// 3 16 -9 0 1 -5 0 -3 -7.11 0 -0.41
  [3,16,-9,0,1,-5,0,-3,-7.11,0,-0.41],
// 3 16 -9 0 1 -7.11 0 -0.41 -7.55 0 0.23
  [3,16,-9,0,1,-7.11,0,-0.41,-7.55,0,0.23],
// 3 16 -7.7 0 1 -9 0 1 -7.55 0 0.23
  [3,16,-7.7,0,1,-9,0,1,-7.55,0,0.23],
// 3 16 -7.55 0 1.77 -9 0 1 -7.7 0 1
  [3,16,-7.55,0,1.77,-9,0,1,-7.7,0,1],
// 4 16 0 0 -0.8 -0.99 0 -0.6 -5 0 -3 5 0 -3
  [4,16,0,0,-0.8,-0.99,0,-0.6,-5,0,-3,5,0,-3],
// 4 16 1.84 0 -0.04 0.99 0 -0.6 4.29 0 -0.41 3.85 0 0.23
  [4,16,1.84,0,-0.04,0.99,0,-0.6,4.29,0,-0.41,3.85,0,0.23],
// 4 16 2.4 0 0.81 1.84 0 -0.04 3.85 0 0.23 3.7 0 1
  [4,16,2.4,0,0.81,1.84,0,-0.04,3.85,0,0.23,3.7,0,1],
// 4 16 2.6 0 1.8 2.4 0 0.81 3.7 0 1 3.85 0 1.77
  [4,16,2.6,0,1.8,2.4,0,0.81,3.7,0,1,3.85,0,1.77],
// 4 16 2.6 0 2.2 2.6 0 1.8 3.85 0 1.77 4.1 0 2.2
  [4,16,2.6,0,2.2,2.6,0,1.8,3.85,0,1.77,4.1,0,2.2],
// 3 16 3.6 0 2.5 2.6 0 2.2 4.1 0 2.2
  [3,16,3.6,0,2.5,2.6,0,2.2,4.1,0,2.2],
// 3 16 3.3 0 2.8 2.6 0 2.2 3.6 0 2.5
  [3,16,3.3,0,2.8,2.6,0,2.2,3.6,0,2.5],
// 4 16 5 0 -3 4.93 0 -0.85 4.29 0 -0.41 0.99 0 -0.6
  [4,16,5,0,-3,4.93,0,-0.85,4.29,0,-0.41,0.99,0,-0.6],
// 3 16 4.93 0 -0.85 5 0 -3 5.7 0 -1
  [3,16,4.93,0,-0.85,5,0,-3,5.7,0,-1],
// 3 16 6.47 0 -0.85 5.7 0 -1 5 0 -3
  [3,16,6.47,0,-0.85,5.7,0,-1,5,0,-3],
// 3 16 7.11 0 -0.41 6.47 0 -0.85 5 0 -3
  [3,16,7.11,0,-0.41,6.47,0,-0.85,5,0,-3],
// 3 16 9 0 1 7.11 0 -0.41 5 0 -3
  [3,16,9,0,1,7.11,0,-0.41,5,0,-3],
// 3 16 9 0 1 7.55 0 0.23 7.11 0 -0.41
  [3,16,9,0,1,7.55,0,0.23,7.11,0,-0.41],
// 3 16 9 0 1 7.7 0 1 7.55 0 0.23
  [3,16,9,0,1,7.7,0,1,7.55,0,0.23],
// 3 16 7.55 0 1.77 7.7 0 1 9 0 1
  [3,16,7.55,0,1.77,7.7,0,1,9,0,1],
// 3 16 0.99 0 -0.6 0 0 -0.8 5 0 -3
  [3,16,0.99,0,-0.6,0,0,-0.8,5,0,-3],
];
module ldraw_lib__3070bp1d(step=0, col=false, unit=2/5, alt=false, line=0.2, solid=!$preview)
    makepoly(ldraw_lib__3070bp1d(), step=step, col=col, unit=unit, alt=alt, line=line, solid=solid);
ldraw_lib__3070bp1d(line=0.2);
